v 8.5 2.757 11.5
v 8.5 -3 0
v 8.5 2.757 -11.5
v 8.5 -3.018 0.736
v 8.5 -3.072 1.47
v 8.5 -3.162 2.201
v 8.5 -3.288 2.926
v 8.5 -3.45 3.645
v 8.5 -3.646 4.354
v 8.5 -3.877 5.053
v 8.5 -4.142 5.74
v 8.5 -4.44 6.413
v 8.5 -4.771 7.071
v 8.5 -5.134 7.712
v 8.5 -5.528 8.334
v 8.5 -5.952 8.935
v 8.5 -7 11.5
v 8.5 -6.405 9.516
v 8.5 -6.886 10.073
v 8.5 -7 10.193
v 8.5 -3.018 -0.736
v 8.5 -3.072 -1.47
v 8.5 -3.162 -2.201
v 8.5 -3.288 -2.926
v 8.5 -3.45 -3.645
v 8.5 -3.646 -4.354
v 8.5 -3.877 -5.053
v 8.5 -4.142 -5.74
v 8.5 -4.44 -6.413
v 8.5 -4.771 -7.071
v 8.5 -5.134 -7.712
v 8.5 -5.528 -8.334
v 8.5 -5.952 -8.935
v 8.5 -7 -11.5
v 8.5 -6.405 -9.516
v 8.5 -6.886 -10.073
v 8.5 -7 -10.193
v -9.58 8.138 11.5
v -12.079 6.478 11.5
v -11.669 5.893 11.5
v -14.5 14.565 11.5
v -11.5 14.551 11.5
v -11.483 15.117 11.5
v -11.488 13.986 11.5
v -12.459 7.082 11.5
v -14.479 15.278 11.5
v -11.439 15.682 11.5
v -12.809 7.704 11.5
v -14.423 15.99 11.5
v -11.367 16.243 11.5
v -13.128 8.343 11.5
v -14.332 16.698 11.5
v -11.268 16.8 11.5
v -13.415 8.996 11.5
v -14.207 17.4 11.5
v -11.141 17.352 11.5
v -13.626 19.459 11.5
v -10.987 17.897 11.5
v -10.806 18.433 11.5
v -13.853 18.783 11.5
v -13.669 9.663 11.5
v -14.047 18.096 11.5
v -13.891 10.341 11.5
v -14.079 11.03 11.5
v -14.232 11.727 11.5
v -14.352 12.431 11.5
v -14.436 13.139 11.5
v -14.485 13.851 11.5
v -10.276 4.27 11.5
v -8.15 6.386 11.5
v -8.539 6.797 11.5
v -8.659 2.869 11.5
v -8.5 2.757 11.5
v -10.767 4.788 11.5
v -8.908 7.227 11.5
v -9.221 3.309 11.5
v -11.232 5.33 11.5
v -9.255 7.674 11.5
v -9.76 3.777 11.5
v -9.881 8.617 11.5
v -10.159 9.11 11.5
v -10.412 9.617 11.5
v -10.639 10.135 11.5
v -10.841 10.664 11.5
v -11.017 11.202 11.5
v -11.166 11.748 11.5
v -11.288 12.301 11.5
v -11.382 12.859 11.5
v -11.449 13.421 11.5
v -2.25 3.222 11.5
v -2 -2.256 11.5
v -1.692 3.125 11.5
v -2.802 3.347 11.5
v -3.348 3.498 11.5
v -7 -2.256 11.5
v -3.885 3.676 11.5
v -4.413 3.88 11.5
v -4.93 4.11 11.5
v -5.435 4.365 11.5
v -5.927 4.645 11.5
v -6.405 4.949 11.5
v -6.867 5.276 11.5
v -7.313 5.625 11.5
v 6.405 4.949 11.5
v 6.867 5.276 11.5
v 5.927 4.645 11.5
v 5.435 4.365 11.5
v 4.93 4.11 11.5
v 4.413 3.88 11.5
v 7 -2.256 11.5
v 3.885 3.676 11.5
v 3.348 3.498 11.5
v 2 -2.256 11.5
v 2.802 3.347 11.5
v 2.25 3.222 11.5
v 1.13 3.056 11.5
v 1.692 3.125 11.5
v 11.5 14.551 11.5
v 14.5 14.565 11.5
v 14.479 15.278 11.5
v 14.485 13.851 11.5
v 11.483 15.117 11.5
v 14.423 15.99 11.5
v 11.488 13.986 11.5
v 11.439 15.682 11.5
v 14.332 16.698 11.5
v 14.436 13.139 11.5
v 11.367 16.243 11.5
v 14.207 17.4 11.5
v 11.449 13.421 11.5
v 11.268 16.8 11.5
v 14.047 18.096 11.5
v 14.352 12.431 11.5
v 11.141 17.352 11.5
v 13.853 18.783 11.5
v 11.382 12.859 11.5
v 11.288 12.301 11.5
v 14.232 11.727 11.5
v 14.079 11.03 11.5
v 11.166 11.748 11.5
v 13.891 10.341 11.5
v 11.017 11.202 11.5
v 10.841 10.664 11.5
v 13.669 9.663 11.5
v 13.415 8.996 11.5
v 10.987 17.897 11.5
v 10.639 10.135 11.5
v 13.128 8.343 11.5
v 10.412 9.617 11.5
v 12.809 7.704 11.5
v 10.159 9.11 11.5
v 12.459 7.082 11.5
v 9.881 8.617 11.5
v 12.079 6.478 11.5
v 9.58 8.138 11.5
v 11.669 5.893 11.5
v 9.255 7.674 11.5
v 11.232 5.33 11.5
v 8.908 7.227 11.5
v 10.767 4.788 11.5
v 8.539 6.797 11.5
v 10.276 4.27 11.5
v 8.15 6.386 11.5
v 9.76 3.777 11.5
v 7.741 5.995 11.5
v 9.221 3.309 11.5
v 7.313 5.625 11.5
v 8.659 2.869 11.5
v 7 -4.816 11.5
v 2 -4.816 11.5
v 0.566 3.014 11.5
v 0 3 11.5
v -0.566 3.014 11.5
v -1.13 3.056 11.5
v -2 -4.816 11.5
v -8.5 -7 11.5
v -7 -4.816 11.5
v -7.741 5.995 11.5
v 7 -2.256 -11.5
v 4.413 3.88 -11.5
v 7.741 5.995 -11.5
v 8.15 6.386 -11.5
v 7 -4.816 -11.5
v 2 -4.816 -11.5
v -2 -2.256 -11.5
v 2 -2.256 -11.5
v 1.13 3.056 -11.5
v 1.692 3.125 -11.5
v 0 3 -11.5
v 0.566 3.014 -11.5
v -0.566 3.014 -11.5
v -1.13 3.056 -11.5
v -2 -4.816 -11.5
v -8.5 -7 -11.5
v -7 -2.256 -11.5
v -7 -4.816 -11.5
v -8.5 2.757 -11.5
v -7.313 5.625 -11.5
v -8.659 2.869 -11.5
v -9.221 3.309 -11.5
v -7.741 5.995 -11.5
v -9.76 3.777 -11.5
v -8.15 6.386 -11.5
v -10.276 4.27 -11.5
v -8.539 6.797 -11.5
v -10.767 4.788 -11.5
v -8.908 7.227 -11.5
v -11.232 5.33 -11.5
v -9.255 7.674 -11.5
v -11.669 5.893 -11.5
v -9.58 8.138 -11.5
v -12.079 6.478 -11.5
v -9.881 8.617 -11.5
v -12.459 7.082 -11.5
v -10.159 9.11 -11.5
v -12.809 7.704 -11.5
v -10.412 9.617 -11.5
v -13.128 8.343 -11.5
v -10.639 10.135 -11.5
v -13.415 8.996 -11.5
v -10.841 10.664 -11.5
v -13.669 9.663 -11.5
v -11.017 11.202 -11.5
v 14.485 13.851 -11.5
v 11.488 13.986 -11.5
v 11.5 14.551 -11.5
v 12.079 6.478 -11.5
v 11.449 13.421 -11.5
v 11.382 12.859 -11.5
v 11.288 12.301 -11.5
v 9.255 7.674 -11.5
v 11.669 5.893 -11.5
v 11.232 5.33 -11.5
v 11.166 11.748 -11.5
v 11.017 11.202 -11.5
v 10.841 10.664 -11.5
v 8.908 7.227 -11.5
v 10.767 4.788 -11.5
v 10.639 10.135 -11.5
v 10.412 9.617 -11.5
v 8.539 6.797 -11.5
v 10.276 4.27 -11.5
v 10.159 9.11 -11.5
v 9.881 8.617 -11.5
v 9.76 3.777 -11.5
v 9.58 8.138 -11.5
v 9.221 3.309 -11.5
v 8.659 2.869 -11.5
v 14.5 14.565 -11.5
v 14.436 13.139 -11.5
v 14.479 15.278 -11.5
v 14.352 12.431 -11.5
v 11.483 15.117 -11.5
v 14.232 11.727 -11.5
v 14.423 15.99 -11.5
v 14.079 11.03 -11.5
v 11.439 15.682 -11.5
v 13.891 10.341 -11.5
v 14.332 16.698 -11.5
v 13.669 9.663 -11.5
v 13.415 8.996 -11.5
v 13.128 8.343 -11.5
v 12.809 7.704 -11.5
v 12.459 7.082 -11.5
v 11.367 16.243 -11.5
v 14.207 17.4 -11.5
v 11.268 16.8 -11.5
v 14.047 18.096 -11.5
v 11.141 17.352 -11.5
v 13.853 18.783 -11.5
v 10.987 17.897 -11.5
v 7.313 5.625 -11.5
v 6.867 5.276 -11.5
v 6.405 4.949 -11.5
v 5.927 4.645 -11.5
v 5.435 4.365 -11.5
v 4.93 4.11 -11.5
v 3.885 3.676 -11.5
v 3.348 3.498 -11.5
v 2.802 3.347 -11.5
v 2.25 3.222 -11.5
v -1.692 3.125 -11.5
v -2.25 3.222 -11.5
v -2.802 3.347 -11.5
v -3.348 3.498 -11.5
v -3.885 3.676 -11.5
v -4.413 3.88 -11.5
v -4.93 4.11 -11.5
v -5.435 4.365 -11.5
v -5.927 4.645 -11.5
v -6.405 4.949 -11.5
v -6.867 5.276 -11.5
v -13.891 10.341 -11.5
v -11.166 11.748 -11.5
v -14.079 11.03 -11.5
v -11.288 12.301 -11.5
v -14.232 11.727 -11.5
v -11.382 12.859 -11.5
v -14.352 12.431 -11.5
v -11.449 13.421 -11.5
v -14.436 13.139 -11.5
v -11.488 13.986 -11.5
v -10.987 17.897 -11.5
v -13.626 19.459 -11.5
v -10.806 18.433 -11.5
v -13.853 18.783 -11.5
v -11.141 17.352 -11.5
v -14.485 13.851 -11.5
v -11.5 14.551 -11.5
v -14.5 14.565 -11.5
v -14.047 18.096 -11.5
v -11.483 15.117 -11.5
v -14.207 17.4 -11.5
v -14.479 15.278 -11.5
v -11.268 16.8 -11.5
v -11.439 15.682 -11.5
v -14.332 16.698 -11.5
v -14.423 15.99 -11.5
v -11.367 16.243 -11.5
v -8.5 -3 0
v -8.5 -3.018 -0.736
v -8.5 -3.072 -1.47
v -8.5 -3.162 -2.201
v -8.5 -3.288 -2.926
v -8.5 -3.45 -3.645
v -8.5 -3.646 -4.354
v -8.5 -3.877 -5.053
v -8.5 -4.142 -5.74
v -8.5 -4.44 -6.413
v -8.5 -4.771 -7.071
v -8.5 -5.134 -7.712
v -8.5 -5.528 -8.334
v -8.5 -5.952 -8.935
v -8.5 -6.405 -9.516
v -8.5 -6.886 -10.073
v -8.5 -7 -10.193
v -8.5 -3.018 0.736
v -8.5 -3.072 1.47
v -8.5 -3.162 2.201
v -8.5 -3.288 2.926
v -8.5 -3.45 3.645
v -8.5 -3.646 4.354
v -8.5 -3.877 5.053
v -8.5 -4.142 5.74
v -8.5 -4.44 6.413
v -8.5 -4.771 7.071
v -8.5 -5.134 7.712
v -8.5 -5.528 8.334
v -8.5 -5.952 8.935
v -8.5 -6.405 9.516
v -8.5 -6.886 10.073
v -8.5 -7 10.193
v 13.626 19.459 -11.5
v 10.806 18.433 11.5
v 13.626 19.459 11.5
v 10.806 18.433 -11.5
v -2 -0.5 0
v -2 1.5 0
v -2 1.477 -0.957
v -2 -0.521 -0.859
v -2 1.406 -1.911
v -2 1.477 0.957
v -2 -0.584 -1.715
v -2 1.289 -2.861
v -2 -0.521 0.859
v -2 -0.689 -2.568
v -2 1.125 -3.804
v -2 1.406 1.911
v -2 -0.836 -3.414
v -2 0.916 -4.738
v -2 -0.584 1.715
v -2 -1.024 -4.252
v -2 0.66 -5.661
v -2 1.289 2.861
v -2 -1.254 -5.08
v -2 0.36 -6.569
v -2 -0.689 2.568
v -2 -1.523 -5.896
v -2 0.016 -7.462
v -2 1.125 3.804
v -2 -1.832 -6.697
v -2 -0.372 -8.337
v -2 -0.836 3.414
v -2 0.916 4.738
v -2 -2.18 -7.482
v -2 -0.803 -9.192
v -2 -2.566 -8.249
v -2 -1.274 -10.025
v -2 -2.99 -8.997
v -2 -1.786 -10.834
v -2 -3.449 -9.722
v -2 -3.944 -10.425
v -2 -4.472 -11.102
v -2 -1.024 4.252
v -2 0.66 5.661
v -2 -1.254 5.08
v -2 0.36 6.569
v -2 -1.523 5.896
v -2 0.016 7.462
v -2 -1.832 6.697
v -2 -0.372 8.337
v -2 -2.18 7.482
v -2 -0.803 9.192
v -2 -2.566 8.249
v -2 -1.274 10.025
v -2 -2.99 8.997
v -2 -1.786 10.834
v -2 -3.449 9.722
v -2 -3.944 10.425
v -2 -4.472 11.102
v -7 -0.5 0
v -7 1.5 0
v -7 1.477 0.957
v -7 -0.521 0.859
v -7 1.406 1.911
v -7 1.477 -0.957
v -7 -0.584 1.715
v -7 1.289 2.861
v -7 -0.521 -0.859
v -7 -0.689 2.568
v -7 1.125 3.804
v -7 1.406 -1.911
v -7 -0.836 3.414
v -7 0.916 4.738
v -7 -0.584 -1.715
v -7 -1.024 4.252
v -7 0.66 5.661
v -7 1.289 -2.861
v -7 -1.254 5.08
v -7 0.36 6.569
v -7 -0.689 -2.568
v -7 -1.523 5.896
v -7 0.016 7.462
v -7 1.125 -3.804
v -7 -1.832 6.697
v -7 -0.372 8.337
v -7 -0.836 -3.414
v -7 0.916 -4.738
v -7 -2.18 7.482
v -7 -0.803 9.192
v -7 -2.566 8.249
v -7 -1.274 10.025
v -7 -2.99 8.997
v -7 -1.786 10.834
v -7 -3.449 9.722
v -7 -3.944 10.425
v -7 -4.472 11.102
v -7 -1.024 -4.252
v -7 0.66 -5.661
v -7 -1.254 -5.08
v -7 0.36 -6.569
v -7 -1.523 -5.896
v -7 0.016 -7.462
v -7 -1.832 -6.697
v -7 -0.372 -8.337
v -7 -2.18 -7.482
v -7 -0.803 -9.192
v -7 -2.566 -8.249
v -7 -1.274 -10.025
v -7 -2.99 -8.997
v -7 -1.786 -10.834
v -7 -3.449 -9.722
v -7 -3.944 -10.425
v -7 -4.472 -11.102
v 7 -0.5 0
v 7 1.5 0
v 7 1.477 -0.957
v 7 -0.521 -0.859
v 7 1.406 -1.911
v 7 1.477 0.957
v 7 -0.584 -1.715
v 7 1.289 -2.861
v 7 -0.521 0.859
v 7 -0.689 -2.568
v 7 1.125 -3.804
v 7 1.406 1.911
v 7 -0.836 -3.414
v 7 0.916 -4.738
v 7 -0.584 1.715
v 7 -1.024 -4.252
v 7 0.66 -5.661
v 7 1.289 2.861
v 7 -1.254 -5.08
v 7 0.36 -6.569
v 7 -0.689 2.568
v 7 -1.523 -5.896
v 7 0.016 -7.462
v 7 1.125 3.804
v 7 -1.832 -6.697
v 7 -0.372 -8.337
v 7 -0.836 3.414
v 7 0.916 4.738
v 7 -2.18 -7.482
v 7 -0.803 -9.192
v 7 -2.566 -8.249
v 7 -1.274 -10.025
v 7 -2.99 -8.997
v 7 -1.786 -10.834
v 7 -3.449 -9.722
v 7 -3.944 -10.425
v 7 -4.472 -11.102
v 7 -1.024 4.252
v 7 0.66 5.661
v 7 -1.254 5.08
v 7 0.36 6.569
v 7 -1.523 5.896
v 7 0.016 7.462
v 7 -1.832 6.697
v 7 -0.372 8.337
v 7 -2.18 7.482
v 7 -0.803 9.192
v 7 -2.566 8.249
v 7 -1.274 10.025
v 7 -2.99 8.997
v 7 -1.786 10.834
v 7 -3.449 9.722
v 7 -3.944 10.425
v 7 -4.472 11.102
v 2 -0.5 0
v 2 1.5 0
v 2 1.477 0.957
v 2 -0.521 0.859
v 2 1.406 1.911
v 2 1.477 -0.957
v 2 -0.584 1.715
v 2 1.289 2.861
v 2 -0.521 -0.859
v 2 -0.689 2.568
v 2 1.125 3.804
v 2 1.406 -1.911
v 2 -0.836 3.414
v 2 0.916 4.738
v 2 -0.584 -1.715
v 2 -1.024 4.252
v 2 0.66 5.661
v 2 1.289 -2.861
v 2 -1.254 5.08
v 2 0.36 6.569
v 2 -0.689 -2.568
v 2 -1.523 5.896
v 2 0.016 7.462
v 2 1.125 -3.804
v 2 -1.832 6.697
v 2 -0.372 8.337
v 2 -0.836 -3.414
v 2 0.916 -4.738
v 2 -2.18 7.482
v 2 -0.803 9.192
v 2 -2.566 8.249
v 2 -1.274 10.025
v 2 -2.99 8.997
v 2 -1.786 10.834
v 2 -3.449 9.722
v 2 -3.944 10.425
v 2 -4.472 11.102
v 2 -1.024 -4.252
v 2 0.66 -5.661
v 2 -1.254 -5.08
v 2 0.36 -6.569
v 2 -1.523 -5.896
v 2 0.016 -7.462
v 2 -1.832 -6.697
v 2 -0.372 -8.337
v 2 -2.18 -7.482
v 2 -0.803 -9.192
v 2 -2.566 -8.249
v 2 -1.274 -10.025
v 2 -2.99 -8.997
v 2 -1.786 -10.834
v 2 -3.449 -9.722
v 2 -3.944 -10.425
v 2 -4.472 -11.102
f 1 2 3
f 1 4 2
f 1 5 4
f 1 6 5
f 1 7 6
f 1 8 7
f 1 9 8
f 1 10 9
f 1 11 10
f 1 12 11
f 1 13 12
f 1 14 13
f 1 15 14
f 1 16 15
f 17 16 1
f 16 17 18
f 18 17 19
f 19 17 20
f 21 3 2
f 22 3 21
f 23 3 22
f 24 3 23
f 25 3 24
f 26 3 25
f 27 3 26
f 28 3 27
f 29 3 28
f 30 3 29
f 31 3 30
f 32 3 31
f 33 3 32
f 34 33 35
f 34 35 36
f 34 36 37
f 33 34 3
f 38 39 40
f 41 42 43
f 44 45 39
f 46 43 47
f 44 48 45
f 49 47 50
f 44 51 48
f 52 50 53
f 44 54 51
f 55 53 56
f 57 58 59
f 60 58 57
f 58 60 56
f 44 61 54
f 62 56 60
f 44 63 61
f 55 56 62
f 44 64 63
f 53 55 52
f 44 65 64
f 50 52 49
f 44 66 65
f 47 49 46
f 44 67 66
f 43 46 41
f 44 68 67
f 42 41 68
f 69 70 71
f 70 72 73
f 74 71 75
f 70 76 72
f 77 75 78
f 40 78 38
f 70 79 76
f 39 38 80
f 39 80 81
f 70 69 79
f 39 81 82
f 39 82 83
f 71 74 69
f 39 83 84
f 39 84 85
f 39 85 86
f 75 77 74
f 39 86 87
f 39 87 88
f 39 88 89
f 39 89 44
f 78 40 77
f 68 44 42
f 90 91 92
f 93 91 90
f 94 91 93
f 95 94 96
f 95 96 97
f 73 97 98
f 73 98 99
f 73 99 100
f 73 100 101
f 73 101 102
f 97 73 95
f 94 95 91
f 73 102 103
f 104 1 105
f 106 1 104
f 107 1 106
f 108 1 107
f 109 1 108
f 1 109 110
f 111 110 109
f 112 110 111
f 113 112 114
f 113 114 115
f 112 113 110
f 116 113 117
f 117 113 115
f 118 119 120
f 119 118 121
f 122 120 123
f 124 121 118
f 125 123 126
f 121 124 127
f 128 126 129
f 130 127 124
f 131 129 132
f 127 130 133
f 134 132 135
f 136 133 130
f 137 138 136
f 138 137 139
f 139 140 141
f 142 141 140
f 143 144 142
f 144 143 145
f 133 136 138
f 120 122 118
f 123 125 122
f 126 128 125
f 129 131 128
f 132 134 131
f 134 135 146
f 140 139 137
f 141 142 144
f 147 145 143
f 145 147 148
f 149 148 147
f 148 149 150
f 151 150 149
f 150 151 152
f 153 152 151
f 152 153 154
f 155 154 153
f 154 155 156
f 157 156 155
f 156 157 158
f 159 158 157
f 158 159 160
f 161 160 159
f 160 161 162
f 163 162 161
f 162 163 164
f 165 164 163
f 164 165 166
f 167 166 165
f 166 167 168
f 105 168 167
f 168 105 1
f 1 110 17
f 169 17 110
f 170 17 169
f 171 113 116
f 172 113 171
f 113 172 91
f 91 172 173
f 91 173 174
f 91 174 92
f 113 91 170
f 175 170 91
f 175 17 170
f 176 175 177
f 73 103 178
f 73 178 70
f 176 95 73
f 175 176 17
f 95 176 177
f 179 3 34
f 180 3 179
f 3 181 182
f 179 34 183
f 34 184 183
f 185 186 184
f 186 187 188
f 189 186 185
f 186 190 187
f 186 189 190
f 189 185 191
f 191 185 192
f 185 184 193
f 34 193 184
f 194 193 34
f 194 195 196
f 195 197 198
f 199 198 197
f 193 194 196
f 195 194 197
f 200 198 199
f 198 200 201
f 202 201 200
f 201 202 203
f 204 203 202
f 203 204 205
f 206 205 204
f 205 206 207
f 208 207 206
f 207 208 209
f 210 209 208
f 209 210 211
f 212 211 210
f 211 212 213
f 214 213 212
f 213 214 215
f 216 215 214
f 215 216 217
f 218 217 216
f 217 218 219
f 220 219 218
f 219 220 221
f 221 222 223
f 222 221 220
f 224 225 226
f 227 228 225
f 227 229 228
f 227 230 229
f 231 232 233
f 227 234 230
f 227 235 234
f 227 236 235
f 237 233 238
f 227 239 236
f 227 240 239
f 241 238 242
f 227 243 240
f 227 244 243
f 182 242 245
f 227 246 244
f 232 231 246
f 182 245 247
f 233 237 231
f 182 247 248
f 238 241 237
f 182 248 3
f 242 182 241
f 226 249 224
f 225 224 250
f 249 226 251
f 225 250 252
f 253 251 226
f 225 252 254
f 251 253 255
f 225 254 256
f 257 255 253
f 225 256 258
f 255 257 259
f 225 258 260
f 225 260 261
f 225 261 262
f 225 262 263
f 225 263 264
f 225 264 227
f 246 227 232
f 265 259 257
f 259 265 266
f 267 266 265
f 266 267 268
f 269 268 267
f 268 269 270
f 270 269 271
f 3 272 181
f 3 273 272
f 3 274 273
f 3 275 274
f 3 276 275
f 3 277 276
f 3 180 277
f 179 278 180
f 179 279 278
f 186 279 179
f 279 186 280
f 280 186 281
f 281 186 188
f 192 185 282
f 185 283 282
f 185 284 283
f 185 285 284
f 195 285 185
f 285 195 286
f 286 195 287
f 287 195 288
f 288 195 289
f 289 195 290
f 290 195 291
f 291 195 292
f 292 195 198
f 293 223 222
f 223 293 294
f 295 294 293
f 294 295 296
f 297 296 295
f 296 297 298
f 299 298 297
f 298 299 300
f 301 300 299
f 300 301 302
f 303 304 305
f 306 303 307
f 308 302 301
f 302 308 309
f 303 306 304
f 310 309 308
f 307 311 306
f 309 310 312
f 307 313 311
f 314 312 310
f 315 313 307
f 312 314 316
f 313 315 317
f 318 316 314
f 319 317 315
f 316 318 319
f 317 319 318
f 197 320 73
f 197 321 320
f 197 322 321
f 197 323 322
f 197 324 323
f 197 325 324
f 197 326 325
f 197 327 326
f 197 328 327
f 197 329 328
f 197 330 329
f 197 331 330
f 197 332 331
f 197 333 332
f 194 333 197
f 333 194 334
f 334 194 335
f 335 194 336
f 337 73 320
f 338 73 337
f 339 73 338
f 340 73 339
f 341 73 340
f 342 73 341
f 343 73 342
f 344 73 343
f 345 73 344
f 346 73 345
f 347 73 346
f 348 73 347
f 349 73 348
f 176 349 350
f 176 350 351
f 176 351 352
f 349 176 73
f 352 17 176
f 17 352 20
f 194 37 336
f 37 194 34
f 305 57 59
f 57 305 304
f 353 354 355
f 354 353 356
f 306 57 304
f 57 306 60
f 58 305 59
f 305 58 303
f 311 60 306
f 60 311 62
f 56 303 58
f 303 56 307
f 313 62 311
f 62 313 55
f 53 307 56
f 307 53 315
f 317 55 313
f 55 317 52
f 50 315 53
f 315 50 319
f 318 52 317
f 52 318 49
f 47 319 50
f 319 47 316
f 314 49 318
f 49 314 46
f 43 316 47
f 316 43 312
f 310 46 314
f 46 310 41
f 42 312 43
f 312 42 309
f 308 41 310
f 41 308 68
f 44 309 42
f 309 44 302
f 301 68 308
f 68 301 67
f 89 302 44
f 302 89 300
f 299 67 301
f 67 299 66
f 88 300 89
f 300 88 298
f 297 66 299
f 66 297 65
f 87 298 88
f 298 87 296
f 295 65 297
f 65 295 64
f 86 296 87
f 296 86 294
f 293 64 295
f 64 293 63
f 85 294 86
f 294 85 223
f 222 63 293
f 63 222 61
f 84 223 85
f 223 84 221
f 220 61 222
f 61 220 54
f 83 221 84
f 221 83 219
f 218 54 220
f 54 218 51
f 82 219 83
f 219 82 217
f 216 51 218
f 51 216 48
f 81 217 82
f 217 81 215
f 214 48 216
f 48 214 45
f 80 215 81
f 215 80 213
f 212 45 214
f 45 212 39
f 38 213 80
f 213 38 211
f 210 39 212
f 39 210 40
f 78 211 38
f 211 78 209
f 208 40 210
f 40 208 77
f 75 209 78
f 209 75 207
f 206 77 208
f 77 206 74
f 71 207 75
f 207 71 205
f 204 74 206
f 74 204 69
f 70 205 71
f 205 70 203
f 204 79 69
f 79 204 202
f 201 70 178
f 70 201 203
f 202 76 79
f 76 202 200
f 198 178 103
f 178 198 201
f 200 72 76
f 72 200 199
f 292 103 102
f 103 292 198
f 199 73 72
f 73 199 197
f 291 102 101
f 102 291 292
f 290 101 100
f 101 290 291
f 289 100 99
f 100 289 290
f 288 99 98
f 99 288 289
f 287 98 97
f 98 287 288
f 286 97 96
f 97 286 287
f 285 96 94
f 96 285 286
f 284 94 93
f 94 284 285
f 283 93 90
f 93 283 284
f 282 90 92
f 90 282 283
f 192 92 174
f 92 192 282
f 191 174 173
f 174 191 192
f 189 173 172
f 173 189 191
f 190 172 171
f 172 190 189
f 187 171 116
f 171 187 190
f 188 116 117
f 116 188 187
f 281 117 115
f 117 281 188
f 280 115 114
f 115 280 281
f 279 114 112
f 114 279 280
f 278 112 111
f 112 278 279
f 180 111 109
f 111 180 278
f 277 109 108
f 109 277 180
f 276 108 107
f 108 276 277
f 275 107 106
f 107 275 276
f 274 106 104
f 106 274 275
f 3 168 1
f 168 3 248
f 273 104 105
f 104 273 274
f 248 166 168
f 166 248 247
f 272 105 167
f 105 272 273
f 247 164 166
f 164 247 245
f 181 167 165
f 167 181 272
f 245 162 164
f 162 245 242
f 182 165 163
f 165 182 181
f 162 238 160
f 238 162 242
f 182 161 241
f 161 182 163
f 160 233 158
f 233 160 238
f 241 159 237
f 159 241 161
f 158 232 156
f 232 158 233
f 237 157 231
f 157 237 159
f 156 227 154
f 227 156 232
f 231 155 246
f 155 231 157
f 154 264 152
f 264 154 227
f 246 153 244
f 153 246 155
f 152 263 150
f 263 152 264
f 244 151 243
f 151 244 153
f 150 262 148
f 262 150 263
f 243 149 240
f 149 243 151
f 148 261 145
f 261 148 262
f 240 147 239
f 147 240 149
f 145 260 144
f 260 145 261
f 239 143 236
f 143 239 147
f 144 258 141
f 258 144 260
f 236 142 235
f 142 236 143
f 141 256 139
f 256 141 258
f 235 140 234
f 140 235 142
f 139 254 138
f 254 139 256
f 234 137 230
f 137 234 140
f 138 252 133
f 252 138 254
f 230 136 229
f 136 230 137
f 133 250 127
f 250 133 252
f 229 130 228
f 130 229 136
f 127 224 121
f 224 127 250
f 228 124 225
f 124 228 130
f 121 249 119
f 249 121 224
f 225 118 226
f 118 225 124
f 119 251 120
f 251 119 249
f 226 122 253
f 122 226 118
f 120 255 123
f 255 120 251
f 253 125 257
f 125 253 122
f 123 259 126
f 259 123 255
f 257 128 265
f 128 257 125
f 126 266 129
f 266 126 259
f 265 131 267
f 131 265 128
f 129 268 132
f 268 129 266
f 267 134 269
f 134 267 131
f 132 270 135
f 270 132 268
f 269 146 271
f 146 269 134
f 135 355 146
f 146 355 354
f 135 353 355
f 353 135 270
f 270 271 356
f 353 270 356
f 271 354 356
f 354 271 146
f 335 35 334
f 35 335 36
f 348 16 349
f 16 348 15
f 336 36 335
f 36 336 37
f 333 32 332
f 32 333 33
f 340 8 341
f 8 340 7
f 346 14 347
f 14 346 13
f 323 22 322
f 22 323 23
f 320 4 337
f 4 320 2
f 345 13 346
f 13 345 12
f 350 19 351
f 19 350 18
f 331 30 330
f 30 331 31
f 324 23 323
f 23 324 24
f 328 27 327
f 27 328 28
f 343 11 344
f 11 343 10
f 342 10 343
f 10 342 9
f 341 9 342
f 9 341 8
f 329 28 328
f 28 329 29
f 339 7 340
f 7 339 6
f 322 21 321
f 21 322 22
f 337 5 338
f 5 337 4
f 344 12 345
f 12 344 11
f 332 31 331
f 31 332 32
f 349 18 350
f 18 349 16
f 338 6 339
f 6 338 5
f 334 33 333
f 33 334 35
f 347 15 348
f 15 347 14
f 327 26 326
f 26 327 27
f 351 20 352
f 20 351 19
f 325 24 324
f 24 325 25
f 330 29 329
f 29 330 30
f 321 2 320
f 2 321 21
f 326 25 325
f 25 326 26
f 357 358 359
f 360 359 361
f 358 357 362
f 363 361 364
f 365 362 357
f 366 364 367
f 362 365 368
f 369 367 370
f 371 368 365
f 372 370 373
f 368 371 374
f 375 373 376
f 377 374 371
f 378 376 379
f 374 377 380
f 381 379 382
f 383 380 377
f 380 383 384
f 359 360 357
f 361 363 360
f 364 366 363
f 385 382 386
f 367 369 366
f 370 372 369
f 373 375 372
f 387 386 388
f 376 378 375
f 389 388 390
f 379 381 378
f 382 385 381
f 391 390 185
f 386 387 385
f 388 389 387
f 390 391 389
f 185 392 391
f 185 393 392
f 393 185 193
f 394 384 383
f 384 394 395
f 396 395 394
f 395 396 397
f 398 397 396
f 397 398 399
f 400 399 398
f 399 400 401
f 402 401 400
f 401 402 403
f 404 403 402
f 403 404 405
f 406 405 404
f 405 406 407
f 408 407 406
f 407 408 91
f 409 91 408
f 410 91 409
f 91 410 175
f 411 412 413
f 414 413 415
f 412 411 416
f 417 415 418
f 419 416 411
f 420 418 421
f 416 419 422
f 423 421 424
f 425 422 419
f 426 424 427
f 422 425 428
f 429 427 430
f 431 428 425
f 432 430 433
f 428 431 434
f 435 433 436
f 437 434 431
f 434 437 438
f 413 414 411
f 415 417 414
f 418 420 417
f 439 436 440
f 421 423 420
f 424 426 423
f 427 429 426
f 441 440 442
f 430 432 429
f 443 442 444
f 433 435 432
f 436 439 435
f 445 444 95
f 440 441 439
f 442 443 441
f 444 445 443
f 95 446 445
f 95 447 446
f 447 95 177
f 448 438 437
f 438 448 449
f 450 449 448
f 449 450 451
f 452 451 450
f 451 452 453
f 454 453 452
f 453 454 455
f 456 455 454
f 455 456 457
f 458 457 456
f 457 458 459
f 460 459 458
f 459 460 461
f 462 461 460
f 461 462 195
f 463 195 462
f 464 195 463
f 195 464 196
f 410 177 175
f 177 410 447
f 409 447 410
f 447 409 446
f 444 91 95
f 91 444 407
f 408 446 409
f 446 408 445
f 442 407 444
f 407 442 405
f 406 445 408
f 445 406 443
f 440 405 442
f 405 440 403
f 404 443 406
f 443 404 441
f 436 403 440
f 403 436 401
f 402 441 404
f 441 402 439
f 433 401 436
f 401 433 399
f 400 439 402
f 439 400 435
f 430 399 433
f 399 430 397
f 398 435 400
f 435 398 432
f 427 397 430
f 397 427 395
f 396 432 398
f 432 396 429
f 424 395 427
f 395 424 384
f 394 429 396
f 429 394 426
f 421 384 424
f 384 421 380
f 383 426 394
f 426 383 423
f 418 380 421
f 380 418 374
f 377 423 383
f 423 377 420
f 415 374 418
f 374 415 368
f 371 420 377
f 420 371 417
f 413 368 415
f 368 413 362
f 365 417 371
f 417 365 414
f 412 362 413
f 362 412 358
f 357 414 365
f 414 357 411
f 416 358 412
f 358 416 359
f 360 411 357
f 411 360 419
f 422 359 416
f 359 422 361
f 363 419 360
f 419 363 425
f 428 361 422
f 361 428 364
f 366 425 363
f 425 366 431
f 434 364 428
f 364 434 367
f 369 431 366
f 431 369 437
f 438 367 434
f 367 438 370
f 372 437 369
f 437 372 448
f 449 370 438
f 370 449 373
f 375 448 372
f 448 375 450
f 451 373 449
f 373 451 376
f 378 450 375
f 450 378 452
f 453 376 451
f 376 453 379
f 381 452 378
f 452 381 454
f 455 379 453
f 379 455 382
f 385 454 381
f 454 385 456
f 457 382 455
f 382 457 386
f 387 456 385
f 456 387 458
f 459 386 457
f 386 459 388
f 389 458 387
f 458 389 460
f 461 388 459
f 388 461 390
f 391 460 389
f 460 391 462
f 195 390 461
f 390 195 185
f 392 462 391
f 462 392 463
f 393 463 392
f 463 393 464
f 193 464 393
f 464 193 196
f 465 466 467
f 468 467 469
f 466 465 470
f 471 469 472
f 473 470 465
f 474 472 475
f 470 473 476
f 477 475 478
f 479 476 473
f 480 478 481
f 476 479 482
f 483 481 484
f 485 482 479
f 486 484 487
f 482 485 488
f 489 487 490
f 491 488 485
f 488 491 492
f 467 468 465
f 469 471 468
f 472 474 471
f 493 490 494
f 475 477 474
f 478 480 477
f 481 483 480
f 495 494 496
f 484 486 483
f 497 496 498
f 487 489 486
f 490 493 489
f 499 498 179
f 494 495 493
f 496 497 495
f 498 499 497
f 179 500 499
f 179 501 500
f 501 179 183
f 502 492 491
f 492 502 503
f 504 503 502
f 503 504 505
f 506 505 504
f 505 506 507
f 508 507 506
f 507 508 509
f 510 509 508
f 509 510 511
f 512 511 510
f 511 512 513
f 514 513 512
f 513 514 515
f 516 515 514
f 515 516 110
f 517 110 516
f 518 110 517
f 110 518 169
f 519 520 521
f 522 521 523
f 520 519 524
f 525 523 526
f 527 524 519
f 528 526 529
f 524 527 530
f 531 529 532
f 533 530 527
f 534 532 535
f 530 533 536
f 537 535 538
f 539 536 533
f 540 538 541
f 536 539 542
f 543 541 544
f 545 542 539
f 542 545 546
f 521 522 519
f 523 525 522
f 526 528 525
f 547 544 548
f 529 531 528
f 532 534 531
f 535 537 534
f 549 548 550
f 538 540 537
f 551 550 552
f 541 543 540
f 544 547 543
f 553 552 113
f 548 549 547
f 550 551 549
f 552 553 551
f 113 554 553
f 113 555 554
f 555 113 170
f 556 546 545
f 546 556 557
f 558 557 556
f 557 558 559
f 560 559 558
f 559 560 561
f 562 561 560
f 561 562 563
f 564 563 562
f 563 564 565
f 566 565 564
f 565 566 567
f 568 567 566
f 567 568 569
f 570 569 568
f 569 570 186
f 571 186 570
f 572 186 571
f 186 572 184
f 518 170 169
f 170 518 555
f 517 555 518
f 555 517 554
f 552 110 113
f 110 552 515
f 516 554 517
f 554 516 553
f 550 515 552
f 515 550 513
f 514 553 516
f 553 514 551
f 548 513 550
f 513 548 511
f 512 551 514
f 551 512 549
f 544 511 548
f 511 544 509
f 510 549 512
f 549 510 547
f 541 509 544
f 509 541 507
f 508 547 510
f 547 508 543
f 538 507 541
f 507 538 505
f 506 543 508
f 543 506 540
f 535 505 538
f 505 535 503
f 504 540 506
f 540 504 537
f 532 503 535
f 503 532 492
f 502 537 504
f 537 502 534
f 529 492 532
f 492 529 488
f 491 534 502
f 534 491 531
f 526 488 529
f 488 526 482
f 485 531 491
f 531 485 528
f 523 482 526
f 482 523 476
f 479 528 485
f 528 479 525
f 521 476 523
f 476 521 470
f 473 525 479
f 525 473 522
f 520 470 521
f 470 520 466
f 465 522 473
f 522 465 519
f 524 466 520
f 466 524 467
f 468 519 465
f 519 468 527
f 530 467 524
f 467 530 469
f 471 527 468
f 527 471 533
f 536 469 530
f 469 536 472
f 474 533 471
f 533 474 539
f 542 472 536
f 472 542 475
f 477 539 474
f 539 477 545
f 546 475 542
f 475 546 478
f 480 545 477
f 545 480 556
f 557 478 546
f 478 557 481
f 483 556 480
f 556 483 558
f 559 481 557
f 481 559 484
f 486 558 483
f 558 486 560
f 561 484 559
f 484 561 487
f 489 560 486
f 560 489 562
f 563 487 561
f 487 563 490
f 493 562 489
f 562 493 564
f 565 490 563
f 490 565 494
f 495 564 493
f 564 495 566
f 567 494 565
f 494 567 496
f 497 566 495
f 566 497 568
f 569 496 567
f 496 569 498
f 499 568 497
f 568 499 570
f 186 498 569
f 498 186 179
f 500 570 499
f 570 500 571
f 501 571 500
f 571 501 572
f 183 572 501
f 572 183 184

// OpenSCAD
// [mm] width of the tie wrap
dx_tie = 5;
// [mm] height of the tie wrap
dy_tie = 2;
// [mm] Inner diameter of the ring holding the torch. Subtract 1 mm from the diameter of your torch for a good grid.
diameter_ring = 23;
// [mm] Thickness of the ring holding the torch
thickness_ring = 3;
// [mm] diameter of the handlebar
diameter_handlebar = 30;

// Number of faces
$fn = 128;
// [mm] size of the entire holder, Z-direction
dz = 23;
// [degrees] 360 is completely round, 180 is a half circle. Increase for better grip, but harder to insert
angle = 220;
// [mm] size of the cube, X-direction, that connects the ring holding the torch and the ring holding the handlebar
dx_cube = 17;
// [mm] size of the cube, Y-direction
dy_cube = 10;
// [mm] overlap of the handlebar cut-out with the cube
overlap_handlebar = 4;
// [degrees] orientation of the handlebar w.r.t. the torch. Always 0 or 90 degrees.
rotate_handlebar = 90;
// [mm] how far apart should the two tie wraps be placed
separation_tie = 4;
// [mm] distance between the tie wrap and the handlebar edge
offset_y_tie = 5;

module ring(diameter, height, thickness, angle=360) {
    // diameter = inner diameter
    // centre placed on origin
    rotate([0, 0, (180-angle)/2+180])
        rotate_extrude(angle=angle)
            translate([diameter/2, -height/2, 0])
                square([thickness, height]);
}

// Subtract (handlebar + tie wraps) cut-outs from (ring + cube)
difference() {  // Comment out this line and the closing brace for debugging, will show the geometry without subtracting parts
    y_cube = -dy_cube+thickness_ring;
    union() {
        // Cube onto which ring is placed
        translate([-dx_cube/2, y_cube, -dz/2])
            cube([dx_cube, dy_cube, dz]);
        // Ring to hold the torch
        translate([0, diameter_ring/2+thickness_ring, 0])
            ring(diameter=diameter_ring, height=dz, thickness=thickness_ring, angle=angle);
    }
    // Handlebar + tie wraps cut-outs
    // Names (x, y, z) are assuming rotation = 0
    rotate([0, rotate_handlebar, 0]) {
        length_cutout = diameter_ring + dz;
        // Handlebar
        y_handlebar = y_cube-diameter_handlebar/2+overlap_handlebar;
        translate([0, y_handlebar, -(length_cutout)/2])
            cylinder(h=length_cutout, d=diameter_handlebar);
        // Tie wraps
        diameter_tie = diameter_handlebar + offset_y_tie;
        translate([0, y_handlebar, -(separation_tie/2 + dx_tie/2)])
            ring(diameter=diameter_tie, height=dx_tie, thickness=dy_tie);
        translate([0, y_handlebar, separation_tie/2 + dx_tie/2])
            ring(diameter=diameter_tie, height=dx_tie, thickness=dy_tie);
    }
}
